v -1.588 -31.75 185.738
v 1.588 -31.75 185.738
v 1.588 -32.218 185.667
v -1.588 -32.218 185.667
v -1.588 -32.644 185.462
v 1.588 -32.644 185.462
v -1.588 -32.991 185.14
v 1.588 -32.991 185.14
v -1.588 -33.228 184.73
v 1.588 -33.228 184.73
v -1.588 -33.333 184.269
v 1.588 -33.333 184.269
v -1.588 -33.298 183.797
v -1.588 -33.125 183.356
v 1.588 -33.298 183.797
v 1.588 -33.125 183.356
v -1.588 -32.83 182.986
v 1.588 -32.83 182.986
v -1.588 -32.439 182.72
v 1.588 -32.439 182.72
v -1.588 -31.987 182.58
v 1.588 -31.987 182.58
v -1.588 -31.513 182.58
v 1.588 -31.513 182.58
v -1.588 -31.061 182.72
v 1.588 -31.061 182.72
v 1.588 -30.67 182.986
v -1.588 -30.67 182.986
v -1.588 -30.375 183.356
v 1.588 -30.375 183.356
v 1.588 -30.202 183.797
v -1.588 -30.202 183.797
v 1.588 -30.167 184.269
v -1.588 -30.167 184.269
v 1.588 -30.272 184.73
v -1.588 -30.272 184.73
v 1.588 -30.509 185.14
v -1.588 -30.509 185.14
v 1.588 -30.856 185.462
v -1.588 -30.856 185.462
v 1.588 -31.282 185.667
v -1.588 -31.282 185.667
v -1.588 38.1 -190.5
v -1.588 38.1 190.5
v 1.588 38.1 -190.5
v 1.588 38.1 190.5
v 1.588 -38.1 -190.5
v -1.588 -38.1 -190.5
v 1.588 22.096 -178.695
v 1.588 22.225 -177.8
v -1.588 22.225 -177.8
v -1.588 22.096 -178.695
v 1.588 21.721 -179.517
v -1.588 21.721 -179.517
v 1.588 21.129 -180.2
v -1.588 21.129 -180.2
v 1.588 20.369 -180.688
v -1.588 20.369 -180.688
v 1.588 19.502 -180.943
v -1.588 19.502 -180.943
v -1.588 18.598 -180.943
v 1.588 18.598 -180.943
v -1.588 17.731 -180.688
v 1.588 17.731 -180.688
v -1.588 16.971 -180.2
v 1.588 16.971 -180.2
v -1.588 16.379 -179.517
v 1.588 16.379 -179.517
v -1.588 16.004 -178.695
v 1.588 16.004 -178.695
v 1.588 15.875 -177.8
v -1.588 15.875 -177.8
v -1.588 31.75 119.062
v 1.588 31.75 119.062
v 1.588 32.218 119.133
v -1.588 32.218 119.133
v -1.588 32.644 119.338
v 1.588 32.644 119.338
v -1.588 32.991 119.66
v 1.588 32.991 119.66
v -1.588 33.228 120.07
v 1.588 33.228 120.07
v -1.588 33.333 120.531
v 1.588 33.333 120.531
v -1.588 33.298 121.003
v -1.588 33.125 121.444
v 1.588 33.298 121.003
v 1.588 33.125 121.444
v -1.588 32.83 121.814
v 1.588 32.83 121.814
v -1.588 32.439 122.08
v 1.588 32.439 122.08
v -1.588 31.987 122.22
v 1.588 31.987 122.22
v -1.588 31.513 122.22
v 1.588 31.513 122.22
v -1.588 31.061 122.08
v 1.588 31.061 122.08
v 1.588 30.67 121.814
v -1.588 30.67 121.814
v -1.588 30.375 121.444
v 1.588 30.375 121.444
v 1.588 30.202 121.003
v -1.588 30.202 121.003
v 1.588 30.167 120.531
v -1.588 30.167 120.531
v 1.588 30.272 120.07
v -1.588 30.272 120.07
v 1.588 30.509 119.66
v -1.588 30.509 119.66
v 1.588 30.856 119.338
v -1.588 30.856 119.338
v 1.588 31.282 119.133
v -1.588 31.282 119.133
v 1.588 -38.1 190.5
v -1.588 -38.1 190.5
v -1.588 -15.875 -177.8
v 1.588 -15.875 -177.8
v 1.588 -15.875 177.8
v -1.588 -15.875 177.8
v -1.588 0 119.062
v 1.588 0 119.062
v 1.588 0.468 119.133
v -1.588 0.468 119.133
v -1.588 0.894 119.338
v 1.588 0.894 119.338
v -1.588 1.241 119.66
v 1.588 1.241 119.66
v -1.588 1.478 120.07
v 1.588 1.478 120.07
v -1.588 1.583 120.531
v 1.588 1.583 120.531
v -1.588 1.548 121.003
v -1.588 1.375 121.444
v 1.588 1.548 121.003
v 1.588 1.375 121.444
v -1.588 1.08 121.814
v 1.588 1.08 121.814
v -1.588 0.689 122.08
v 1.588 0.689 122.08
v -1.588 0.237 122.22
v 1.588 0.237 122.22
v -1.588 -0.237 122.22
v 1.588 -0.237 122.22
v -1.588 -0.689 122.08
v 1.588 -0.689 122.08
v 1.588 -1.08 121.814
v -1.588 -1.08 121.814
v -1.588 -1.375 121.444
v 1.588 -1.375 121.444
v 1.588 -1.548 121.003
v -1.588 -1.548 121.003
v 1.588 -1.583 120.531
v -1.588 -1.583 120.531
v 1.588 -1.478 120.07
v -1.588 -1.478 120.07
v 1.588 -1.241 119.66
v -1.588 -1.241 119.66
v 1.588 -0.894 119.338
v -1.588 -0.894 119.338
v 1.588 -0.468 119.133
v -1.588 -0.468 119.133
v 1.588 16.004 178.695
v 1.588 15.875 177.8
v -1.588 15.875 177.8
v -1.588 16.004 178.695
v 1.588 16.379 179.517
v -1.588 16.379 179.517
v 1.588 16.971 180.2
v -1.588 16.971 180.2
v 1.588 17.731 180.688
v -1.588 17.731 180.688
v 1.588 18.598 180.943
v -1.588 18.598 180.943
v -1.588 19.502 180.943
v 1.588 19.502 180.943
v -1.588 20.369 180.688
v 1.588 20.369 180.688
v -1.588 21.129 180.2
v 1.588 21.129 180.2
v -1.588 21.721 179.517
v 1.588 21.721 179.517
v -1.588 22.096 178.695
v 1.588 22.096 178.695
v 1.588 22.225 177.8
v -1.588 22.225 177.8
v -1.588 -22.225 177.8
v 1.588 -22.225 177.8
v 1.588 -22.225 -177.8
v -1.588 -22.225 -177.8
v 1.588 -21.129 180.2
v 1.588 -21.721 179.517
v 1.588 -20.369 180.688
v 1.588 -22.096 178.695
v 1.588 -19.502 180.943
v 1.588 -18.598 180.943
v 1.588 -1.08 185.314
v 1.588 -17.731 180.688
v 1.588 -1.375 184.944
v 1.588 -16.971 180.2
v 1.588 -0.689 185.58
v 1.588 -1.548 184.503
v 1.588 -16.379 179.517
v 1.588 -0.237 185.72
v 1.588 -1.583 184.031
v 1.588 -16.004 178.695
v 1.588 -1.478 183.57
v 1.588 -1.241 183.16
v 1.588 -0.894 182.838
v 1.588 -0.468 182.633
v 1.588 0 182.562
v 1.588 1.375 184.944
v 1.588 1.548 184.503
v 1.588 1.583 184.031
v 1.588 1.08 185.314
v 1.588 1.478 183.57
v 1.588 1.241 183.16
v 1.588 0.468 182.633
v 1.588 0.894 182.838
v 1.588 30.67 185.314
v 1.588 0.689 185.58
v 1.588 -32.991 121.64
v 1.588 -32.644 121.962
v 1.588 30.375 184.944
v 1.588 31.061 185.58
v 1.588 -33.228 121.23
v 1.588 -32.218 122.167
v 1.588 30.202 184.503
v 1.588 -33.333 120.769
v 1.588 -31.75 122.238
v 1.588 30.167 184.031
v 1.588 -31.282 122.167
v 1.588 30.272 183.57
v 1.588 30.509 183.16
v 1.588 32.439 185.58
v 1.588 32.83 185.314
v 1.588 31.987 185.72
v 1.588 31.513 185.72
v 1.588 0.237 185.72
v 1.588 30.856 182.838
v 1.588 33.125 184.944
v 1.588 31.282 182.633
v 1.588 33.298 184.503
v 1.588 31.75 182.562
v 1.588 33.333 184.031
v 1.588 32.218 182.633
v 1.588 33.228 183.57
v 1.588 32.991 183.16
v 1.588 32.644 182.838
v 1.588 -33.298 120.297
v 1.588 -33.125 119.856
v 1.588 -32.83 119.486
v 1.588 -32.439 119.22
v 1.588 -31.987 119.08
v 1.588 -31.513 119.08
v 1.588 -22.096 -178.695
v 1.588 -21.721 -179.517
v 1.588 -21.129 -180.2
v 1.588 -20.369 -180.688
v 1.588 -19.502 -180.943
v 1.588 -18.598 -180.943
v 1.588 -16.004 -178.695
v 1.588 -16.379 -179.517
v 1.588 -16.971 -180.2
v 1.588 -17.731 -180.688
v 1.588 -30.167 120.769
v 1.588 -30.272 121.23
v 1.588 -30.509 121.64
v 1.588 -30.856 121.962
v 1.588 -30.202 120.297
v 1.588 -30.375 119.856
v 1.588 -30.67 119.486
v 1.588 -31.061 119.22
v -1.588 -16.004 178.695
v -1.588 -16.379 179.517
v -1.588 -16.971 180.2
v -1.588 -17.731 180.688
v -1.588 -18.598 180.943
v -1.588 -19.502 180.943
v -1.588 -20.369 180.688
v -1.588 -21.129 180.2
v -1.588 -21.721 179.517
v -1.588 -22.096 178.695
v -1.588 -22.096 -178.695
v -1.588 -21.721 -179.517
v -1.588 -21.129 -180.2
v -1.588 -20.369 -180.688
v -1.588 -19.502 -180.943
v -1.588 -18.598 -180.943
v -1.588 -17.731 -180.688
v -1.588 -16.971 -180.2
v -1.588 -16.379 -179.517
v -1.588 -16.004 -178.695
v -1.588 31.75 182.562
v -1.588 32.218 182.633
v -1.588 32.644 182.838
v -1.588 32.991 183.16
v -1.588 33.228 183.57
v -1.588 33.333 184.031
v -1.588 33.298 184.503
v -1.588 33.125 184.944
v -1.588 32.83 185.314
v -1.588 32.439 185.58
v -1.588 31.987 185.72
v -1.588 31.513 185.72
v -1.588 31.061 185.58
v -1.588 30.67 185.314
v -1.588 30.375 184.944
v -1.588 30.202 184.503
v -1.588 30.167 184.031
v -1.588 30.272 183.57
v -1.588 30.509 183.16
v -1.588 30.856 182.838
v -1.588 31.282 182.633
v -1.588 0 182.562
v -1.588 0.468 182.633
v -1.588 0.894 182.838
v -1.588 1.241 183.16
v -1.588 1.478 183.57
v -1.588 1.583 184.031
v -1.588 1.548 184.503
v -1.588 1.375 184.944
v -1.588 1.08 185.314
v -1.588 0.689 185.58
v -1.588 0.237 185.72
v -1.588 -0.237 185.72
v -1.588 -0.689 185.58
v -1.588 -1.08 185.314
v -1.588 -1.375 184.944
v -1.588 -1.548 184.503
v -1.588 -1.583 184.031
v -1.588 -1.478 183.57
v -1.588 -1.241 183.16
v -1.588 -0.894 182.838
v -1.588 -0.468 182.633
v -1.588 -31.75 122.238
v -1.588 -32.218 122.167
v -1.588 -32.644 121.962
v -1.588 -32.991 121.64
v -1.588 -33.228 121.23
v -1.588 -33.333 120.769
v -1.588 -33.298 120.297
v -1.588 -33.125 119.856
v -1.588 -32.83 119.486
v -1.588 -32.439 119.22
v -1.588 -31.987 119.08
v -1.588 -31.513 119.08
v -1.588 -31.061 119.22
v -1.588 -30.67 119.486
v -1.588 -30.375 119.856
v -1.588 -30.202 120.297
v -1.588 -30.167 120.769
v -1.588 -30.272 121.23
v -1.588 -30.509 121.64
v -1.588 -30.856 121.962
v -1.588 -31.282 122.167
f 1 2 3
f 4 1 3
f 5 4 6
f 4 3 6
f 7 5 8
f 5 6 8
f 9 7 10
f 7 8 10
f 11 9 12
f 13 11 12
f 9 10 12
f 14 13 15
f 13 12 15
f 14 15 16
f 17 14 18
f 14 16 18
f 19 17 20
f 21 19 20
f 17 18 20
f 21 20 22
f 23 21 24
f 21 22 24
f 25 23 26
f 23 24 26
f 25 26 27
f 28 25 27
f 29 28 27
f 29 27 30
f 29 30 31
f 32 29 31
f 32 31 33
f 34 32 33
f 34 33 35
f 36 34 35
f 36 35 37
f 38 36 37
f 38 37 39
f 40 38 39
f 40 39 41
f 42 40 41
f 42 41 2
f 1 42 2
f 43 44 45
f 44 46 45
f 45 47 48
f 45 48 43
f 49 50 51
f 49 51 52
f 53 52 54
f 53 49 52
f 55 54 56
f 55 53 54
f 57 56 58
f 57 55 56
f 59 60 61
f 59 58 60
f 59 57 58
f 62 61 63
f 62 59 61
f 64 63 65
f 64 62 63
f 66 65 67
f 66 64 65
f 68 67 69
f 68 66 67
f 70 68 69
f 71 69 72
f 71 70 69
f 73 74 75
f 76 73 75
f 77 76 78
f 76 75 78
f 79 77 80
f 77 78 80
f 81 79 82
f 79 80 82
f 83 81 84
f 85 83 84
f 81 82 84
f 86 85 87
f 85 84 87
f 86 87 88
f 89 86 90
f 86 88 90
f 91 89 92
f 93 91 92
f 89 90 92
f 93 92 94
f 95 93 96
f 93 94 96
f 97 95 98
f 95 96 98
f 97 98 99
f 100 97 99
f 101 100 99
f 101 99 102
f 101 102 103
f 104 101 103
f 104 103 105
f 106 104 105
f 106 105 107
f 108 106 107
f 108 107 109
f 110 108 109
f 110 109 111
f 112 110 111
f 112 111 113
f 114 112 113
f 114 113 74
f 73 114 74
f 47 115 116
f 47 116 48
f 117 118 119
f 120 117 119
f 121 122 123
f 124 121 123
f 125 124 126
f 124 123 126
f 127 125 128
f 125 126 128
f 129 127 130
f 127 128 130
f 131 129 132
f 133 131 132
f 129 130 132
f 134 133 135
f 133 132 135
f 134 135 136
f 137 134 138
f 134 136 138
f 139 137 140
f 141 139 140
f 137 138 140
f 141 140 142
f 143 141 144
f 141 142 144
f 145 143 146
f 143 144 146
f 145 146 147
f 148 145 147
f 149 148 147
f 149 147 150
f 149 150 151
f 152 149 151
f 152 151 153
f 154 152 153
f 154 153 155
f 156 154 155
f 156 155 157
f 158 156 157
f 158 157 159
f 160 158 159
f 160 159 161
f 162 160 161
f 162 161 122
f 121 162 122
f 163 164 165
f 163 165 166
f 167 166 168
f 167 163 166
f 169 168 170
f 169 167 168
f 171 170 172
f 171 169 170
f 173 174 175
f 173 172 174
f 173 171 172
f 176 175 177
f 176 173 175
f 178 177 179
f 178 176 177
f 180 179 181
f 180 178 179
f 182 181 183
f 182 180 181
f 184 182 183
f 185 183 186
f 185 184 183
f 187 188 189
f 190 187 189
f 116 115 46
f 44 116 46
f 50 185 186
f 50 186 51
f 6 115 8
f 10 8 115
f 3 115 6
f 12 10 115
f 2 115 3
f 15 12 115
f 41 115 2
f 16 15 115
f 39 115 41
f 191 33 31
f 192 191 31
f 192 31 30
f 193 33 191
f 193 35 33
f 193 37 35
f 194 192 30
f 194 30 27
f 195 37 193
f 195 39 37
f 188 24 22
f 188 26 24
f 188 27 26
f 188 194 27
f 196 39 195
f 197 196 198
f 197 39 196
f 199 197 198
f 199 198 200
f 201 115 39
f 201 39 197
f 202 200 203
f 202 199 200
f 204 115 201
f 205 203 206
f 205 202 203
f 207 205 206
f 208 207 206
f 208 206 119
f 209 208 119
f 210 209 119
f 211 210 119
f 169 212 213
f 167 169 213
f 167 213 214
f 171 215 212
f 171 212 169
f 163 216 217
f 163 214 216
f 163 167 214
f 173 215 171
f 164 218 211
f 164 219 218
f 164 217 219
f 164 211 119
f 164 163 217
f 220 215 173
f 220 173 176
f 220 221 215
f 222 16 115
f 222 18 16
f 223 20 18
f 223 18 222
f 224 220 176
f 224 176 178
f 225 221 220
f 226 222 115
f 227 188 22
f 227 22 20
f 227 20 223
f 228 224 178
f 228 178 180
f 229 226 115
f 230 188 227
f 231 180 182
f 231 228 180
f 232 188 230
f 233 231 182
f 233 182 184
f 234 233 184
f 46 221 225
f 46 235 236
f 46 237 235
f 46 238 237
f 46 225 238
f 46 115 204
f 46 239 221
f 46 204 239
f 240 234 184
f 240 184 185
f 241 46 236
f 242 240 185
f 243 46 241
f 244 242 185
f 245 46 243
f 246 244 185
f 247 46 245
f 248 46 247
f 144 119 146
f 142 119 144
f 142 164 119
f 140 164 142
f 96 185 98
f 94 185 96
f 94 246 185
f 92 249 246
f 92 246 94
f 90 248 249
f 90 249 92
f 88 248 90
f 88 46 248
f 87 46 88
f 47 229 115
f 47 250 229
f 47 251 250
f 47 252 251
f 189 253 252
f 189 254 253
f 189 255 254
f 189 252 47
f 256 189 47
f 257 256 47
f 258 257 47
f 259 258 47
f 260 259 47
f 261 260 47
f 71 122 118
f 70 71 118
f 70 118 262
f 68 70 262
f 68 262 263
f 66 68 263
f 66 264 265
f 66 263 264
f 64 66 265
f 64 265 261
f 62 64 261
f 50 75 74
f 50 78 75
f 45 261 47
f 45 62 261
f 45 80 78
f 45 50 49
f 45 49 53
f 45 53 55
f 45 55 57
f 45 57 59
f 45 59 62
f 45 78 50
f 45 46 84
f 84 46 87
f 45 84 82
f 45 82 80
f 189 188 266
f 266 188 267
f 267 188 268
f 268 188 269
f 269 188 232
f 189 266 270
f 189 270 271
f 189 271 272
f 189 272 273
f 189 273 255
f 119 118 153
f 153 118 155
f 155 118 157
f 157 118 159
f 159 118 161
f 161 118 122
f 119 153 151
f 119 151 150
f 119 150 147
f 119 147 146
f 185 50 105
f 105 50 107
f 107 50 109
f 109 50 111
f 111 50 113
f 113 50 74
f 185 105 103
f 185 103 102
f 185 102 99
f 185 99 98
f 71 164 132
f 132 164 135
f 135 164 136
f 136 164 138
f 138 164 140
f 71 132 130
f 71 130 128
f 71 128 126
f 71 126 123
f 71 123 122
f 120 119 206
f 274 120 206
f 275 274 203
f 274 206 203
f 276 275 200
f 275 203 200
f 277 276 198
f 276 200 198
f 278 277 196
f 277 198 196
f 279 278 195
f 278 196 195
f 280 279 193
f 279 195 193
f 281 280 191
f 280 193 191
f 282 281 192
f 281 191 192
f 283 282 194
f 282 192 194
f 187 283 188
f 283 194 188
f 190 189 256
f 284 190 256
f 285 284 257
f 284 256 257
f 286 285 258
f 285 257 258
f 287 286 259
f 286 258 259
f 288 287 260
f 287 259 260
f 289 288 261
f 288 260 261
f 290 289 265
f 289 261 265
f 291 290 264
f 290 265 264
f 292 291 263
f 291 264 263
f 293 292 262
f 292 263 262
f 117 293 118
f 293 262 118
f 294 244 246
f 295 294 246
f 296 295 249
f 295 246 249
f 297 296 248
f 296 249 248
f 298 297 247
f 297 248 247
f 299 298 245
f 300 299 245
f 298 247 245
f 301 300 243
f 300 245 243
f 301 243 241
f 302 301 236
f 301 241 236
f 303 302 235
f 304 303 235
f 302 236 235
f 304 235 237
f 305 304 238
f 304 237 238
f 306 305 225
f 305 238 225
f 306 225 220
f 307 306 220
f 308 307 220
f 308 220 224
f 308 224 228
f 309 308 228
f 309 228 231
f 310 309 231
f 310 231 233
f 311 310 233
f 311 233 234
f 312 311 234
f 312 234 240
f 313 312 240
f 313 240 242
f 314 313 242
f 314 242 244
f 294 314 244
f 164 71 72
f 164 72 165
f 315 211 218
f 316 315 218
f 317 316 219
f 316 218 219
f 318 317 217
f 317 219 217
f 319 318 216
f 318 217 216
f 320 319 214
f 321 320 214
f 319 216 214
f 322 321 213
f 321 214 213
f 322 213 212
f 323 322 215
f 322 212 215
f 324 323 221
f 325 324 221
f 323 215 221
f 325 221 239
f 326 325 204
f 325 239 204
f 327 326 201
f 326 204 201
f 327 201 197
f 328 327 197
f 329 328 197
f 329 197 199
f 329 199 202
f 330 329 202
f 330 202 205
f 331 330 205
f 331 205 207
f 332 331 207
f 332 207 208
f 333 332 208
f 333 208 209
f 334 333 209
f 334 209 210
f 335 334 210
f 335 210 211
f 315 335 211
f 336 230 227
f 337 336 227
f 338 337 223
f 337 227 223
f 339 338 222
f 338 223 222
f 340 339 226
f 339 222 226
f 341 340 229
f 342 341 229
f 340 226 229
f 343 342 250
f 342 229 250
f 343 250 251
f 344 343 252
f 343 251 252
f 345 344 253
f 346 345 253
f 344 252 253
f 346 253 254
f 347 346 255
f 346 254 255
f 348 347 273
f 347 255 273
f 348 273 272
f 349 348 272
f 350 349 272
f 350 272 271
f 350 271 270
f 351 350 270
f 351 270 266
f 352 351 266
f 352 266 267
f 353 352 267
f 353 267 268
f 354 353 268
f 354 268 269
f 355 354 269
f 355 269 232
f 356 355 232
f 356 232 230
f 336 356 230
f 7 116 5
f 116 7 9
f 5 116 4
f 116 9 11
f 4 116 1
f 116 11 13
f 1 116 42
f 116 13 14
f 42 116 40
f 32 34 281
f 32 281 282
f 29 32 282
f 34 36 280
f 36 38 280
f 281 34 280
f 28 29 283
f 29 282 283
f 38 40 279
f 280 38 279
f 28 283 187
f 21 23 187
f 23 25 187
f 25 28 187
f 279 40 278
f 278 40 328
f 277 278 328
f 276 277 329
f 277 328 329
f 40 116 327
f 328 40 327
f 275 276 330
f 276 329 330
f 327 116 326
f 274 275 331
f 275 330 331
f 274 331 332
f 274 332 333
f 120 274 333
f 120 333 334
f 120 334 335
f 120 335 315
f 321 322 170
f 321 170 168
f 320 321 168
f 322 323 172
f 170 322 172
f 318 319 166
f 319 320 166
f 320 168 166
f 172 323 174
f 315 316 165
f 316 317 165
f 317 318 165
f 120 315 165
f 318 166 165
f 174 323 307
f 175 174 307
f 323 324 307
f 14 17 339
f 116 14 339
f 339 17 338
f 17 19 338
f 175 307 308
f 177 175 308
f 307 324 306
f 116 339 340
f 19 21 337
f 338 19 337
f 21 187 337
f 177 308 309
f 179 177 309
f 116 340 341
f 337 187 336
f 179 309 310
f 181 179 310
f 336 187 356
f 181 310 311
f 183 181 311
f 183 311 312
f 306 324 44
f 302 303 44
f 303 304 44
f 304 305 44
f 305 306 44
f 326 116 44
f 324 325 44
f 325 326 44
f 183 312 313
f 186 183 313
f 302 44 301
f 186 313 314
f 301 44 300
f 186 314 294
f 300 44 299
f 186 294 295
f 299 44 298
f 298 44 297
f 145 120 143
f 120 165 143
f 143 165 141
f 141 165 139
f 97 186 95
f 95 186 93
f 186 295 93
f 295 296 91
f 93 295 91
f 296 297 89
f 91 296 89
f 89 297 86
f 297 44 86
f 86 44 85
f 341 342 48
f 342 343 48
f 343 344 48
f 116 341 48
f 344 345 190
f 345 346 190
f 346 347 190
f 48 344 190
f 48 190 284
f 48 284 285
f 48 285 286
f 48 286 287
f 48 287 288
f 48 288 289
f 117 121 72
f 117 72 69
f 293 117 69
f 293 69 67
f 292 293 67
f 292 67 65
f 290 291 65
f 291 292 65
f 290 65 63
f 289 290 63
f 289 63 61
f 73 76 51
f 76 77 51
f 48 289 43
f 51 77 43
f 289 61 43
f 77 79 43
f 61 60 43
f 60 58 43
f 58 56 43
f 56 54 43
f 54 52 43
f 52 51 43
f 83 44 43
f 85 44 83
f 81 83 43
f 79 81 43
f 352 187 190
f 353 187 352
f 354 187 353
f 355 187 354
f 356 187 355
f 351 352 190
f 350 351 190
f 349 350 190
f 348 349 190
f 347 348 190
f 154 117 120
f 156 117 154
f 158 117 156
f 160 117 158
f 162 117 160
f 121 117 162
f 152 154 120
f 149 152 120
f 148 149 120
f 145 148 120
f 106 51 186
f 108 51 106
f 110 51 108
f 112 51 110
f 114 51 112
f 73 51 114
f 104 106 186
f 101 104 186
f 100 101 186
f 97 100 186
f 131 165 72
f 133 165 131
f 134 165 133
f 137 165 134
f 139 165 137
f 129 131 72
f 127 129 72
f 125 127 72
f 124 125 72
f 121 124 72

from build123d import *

# Parameters (mm, degrees)
SKETCH1_W         = 381
SKETCH1_H         = 76.2
OUTER_CUT_DEPTH   = 1.5875
SLOTS_DEPTH       = 195.298586266
SKETCH3_R         = 1.5875
MOUNT_HOLES_DEPTH = 195.298586266


with BuildPart() as part:
    # Sketch1 → Outer Cut (new, symmetric)
    with BuildSketch(Plane(origin=(0, 0, 0), x_dir=(0, 0, -1), z_dir=(1, 0, 0))):
        Rectangle(SKETCH1_W, SKETCH1_H)
    extrude(amount=OUTER_CUT_DEPTH, both=True)

    # Sketch2 → Slots (cut, through all)
    with BuildSketch(Plane(origin=(1.5875, 0, 0), x_dir=(0, 0, -1), z_dir=(1, 0, 0))):
        with BuildLine():
            Line((-177.8, 22.225), (177.8, 22.225))
            ThreePointArc((177.8, 22.225), (180.975, 19.05), (177.8, 15.875))
            Line((177.8, 15.875), (-177.8, 15.875))
            ThreePointArc((-177.8, 15.875), (-180.975, 19.05), (-177.8, 22.225))
        make_face()
        with BuildLine():
            Line((-177.8, -22.225), (177.8, -22.225))
            ThreePointArc((177.8, -22.225), (180.975, -19.05), (177.8, -15.875))
            Line((177.8, -15.875), (-177.8, -15.875))
            ThreePointArc((-177.8, -15.875), (-180.975, -19.05), (-177.8, -22.225))
        make_face()
    extrude(amount=-SLOTS_DEPTH, mode=Mode.SUBTRACT)

    # Sketch3 → Mount Holes (cut, through all)
    with BuildSketch(Plane(origin=(1.5875, 0, 0), x_dir=(0, 0, -1), z_dir=(1, 0, 0))):
        with Locations((-184.15, 31.75)):
            Circle(SKETCH3_R)
        with Locations((-120.65, 31.75)):
            Circle(SKETCH3_R)
        with Locations(Location((-120.65, -31.75, 0), (0, 0, 180))):
            Circle(SKETCH3_R)
        with Locations(Location((-184.15, -31.75, 0), (0, 0, 180))):
            Circle(SKETCH3_R)
        with Locations((-184.15, 0)):
            Circle(SKETCH3_R)
        with Locations((-120.65, 0)):
            Circle(SKETCH3_R)
    extrude(amount=-MOUNT_HOLES_DEPTH, mode=Mode.SUBTRACT)


solid = part.part
